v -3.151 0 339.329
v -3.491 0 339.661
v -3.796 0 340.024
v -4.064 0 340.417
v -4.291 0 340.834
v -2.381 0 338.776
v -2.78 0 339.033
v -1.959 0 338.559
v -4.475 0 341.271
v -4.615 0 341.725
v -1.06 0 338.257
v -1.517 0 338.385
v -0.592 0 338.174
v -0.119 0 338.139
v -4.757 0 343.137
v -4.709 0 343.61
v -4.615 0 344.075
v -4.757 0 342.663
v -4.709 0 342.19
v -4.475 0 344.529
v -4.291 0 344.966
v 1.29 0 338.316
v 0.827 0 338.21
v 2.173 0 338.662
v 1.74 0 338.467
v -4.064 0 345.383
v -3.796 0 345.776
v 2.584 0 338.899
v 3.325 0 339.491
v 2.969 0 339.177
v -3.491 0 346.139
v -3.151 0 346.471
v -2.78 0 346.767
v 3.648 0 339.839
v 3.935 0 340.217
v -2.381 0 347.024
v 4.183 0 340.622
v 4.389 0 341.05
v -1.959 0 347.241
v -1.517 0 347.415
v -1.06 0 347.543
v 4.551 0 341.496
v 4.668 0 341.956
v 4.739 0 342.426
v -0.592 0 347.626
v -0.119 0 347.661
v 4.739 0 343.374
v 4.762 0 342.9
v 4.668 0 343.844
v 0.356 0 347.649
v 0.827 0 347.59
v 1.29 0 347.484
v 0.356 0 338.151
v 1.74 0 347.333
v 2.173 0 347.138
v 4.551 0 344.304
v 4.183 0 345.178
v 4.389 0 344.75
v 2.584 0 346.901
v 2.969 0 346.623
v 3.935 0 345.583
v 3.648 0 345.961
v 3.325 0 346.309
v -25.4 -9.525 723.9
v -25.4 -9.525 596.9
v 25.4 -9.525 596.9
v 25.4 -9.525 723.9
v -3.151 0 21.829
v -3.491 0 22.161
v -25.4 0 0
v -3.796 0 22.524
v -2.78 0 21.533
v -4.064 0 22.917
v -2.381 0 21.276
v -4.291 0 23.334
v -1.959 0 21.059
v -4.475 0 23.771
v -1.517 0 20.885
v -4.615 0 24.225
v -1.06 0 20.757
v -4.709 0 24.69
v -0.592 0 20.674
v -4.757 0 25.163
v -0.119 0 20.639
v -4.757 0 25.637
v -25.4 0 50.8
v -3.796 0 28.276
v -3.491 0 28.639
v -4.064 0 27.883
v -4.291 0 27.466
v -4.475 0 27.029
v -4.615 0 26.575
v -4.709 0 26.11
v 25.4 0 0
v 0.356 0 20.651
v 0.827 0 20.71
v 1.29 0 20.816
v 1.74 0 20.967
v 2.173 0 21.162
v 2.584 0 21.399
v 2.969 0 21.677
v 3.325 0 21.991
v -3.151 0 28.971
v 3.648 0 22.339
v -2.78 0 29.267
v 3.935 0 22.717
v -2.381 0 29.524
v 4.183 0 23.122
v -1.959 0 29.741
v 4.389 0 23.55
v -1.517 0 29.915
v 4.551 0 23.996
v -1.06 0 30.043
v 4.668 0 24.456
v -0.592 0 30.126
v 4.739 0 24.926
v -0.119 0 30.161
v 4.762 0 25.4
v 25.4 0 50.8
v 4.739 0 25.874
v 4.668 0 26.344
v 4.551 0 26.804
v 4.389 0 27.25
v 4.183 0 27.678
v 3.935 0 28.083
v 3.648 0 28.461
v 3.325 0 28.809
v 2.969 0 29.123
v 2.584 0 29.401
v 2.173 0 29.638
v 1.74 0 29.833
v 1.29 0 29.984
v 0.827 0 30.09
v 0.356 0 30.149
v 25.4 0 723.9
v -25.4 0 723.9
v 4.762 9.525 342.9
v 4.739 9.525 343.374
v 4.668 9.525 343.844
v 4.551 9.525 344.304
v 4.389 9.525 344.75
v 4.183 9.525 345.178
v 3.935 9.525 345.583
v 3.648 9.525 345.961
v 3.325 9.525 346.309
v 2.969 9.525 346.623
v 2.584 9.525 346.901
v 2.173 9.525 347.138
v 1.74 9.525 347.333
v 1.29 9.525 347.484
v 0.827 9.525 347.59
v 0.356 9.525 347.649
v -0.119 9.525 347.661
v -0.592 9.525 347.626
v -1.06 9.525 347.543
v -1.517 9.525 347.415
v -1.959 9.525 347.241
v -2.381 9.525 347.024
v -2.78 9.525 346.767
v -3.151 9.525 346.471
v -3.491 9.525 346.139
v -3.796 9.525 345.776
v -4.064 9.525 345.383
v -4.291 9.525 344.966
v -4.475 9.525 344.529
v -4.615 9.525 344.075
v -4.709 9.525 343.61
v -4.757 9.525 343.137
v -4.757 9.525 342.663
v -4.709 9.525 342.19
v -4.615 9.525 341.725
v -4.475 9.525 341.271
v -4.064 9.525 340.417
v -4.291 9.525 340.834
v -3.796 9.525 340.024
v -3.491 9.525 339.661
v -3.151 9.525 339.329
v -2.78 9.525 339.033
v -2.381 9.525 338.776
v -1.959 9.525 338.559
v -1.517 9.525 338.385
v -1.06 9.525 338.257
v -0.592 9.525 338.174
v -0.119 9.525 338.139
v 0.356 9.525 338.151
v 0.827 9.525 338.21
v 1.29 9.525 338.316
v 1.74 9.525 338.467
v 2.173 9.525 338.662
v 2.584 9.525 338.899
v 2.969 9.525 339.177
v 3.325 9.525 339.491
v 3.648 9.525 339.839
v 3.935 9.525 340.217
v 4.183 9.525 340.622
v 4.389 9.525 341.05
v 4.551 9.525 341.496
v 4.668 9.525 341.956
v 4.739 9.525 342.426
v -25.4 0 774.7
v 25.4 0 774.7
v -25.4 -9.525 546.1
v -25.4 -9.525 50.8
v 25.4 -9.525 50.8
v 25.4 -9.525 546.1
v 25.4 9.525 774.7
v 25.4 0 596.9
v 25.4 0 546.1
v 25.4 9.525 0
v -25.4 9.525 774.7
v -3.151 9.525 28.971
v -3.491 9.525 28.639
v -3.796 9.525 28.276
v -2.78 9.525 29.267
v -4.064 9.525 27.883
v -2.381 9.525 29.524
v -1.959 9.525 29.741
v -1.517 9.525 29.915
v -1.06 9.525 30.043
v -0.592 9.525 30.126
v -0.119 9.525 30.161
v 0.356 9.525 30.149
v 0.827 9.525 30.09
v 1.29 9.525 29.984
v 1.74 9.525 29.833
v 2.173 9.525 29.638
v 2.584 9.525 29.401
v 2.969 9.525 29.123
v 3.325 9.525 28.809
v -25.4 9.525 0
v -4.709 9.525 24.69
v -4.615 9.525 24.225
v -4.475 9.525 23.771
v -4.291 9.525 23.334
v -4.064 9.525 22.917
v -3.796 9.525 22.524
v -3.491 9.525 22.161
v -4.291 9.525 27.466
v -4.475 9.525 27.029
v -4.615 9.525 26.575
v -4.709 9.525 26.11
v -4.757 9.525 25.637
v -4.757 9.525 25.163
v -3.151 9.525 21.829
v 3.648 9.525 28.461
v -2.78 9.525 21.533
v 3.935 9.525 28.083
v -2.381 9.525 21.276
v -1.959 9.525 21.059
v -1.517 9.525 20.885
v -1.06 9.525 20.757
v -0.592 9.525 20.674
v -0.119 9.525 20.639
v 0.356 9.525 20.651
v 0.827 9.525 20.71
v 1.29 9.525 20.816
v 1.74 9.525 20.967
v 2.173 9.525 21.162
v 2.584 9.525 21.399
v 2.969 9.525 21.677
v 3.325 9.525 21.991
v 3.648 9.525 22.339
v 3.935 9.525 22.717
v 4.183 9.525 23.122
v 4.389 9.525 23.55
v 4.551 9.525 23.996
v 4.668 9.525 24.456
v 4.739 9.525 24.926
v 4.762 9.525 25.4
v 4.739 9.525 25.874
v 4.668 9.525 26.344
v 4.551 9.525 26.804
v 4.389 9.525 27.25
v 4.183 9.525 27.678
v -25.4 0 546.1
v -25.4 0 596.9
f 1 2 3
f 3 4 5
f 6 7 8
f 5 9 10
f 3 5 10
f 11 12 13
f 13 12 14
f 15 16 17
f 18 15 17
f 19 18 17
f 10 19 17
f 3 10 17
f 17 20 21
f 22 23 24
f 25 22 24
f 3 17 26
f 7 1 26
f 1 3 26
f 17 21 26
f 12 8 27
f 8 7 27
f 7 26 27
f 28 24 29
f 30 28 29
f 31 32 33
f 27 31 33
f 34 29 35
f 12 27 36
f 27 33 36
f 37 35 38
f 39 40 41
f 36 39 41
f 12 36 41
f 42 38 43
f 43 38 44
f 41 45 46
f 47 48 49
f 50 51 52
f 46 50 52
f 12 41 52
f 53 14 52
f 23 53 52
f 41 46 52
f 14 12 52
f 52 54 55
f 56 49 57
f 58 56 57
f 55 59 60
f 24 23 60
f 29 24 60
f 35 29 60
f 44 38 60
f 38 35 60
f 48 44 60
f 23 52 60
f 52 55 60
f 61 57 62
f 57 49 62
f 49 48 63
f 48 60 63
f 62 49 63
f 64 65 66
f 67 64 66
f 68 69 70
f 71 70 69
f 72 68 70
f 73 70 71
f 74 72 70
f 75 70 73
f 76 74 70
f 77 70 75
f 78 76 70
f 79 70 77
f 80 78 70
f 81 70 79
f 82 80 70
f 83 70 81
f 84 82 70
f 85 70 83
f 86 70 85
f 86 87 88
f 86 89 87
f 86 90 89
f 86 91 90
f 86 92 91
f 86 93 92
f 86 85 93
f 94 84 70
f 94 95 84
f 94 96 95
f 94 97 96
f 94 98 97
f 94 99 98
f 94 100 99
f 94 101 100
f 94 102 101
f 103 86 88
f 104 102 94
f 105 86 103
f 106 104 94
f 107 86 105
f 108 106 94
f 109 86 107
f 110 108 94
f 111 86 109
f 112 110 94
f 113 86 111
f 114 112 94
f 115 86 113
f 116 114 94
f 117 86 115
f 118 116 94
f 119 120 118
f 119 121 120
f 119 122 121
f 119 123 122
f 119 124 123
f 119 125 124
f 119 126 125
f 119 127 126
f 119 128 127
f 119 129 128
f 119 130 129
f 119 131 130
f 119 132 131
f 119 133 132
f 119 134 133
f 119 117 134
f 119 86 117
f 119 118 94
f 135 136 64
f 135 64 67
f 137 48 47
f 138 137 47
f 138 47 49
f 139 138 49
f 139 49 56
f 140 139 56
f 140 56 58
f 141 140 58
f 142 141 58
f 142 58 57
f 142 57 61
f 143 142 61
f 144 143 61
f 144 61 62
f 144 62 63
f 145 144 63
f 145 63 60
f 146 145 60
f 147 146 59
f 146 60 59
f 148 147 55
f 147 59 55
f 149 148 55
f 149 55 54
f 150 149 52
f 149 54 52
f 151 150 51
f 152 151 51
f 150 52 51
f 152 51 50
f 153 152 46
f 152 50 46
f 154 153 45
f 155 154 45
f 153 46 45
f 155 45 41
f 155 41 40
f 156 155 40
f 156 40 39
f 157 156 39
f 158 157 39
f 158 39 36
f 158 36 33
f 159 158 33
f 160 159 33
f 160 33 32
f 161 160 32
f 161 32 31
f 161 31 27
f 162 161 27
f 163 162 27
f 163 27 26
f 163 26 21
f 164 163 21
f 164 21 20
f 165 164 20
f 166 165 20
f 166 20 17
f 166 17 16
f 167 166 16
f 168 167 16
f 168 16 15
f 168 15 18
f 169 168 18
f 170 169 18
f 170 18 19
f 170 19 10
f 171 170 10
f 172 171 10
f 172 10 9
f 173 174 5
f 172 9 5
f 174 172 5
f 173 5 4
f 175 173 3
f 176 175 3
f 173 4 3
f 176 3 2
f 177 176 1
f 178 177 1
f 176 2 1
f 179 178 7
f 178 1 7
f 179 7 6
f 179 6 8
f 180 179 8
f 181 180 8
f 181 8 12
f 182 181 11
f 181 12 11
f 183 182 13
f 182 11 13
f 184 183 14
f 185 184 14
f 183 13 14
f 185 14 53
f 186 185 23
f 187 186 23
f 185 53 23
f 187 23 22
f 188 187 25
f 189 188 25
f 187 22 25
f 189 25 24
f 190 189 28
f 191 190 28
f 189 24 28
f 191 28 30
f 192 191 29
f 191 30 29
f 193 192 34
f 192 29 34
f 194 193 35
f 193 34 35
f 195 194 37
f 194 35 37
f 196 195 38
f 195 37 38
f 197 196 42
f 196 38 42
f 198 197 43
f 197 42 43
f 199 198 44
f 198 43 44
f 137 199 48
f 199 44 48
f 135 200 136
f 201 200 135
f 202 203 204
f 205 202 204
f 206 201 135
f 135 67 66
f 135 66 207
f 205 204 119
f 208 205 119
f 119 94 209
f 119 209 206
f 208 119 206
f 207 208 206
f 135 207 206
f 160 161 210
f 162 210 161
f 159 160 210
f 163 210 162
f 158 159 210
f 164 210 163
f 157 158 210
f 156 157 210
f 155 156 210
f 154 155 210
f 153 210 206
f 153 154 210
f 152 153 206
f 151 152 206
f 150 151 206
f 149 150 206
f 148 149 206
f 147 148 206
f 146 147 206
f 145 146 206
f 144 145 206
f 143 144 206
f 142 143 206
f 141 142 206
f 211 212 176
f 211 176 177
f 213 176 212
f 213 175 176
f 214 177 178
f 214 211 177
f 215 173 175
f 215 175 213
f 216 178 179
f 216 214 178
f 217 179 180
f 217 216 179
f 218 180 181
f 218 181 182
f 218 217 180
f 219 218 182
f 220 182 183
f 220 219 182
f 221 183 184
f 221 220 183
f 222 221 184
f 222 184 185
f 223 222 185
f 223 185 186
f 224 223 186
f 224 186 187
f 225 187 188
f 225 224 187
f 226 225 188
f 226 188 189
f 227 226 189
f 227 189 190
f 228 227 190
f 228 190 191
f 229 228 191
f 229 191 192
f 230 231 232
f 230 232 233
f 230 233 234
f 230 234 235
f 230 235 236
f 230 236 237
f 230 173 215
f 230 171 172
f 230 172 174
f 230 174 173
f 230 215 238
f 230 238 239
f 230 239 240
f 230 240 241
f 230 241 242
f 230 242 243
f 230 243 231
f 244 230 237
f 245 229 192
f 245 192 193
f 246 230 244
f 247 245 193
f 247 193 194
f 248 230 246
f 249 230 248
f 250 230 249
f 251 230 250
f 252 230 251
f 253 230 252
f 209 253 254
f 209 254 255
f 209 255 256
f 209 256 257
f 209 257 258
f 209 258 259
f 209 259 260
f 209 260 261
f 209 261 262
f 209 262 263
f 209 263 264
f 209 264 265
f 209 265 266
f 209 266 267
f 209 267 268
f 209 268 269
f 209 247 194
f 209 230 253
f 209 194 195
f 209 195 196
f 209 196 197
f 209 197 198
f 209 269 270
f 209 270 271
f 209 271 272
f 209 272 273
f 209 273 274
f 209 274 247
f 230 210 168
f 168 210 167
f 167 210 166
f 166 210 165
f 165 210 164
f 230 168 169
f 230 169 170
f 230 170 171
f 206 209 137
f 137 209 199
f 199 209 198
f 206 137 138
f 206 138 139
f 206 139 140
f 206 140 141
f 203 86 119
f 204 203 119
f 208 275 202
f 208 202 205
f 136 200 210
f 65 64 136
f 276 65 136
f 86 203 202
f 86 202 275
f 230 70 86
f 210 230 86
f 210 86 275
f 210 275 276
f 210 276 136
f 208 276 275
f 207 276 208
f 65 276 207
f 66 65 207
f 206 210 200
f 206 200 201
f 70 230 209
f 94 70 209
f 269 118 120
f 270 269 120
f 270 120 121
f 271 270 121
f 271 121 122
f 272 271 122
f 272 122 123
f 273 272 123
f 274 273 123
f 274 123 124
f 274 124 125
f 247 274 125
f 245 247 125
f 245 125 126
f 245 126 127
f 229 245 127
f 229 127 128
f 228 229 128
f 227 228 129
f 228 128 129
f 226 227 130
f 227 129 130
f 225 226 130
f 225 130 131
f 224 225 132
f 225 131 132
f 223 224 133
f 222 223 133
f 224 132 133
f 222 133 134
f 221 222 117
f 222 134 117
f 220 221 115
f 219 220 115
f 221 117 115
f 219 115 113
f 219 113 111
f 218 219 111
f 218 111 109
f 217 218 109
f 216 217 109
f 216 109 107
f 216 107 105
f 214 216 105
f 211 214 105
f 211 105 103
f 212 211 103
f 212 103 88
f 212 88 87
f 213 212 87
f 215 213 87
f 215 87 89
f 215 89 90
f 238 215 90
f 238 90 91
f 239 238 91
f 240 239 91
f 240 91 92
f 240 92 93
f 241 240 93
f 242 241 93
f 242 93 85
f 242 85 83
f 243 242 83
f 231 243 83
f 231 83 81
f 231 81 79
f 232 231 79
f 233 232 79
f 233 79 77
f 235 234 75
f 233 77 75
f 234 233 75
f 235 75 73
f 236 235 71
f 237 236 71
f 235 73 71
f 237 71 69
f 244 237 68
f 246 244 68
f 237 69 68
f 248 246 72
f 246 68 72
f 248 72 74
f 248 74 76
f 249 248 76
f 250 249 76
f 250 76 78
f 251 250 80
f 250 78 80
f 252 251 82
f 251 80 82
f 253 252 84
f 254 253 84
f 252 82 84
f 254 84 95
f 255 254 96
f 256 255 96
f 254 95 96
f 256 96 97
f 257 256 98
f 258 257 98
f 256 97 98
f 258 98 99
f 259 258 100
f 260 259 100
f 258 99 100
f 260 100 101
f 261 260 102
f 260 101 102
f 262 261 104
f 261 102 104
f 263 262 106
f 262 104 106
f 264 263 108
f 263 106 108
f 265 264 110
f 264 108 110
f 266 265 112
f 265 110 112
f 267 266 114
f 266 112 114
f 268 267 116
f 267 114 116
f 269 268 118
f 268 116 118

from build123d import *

# Parameters (mm, degrees)
F0_W     = 50.8
F0_H     = 19.05
F1_DEPTH = 774.7
F2_W     = 122.43557321
F2_H     = 50.8
F2_W_2   = 343.1604206562
F2_W_3   = 261.0546275973
F3_DEPTH = 25.4
F4_R     = 4.7625
F5_DEPTH = 25.4


# Not quite as in the source:
# - a feature names something its author has since deleted; it is built from what else it names


with BuildPart() as f1:
    # F0 (on Top) → F1 (new body)
    with BuildSketch(Plane.XY):
        Rectangle(F0_W, F0_H)
    extrude(amount=F1_DEPTH)

    # F2 (on Front) → F3 (cut)
    with BuildSketch(Plane.XZ):
        with Locations((22.4465244144, 25.4)):
            Rectangle(F2_W, F2_H)
        with Locations((-38.7818217278, 749.3)):
            Rectangle(F2_W_2, F2_H)
        with Locations((-37.622589618, 571.5)):
            Rectangle(F2_W_3, F2_H)
    extrude(amount=F3_DEPTH, mode=Mode.SUBTRACT)

    # F4 (on Front) → F5 (cut)
    with BuildSketch(Plane.XZ):
        with Locations((0, 25.4)):
            Circle(F4_R)
        with Locations((0, 342.9)):
            Circle(F4_R)
    extrude(amount=-F5_DEPTH, mode=Mode.SUBTRACT)


solid = f1.part
